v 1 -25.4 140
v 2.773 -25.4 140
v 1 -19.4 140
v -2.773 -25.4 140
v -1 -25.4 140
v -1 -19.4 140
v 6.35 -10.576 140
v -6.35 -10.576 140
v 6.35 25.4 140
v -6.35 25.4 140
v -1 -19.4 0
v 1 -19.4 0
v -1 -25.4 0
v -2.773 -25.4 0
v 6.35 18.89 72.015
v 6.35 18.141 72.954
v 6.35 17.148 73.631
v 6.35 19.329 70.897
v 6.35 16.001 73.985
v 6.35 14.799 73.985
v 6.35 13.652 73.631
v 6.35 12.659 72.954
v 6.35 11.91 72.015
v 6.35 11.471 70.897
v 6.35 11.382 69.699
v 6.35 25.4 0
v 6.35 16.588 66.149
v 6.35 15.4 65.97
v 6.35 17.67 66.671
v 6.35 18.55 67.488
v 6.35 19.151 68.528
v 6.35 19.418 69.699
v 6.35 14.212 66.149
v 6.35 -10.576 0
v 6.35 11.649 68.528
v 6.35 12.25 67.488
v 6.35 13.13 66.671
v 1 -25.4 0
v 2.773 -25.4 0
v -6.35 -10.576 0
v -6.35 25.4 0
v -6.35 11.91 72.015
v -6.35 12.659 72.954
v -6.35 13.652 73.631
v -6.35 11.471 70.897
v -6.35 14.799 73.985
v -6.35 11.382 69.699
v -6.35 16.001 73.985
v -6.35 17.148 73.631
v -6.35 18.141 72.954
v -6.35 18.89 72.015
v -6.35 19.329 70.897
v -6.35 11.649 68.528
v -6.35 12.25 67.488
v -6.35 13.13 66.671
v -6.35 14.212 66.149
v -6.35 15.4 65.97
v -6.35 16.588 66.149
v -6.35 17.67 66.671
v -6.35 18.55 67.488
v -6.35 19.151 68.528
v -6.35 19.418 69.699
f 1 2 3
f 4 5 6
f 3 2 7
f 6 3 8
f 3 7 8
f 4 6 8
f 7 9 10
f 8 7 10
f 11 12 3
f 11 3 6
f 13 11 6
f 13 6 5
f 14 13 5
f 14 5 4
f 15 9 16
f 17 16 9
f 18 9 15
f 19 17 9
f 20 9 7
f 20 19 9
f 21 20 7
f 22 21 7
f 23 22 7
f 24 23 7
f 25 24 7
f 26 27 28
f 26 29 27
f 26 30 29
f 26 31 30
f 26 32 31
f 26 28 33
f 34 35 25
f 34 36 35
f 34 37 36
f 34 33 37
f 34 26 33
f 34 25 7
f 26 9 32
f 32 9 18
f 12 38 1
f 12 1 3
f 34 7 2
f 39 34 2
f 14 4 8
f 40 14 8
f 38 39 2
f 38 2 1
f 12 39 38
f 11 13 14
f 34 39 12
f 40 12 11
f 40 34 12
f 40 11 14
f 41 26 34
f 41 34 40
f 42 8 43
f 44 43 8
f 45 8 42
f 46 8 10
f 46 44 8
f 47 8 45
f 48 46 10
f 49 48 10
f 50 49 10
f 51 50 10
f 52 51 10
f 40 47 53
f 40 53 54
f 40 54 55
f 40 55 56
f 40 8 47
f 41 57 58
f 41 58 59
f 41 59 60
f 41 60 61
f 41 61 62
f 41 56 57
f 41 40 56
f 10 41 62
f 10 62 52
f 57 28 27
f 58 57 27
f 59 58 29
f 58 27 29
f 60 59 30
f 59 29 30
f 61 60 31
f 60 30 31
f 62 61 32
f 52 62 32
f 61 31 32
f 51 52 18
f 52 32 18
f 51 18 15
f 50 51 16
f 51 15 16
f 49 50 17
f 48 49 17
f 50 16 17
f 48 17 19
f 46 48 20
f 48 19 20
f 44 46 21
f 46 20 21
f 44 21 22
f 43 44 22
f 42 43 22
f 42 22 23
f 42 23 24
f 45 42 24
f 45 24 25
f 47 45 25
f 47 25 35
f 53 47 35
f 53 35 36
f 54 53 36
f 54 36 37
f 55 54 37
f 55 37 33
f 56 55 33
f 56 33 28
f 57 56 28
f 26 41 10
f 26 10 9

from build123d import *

# Parameters (mm, degrees)
SALIENTE_EXTRUIR1_DEPTH = 140
CROQUIS2_R              = 4.029640203
CORTAR_EXTRUIR1_DEPTH   = 140


with BuildPart() as part:
    # Croquis1 → Saliente-Extruir1 (new body)
    with BuildSketch(Plane.XY):
        Polygon((-1, -25.4), (-2.773222037, -25.4), (-6.35, -10.576393443), (-6.35, 25.4), (6.35, 25.4), (6.35, -10.576393443), (2.773222037, -25.4), (1, -25.4), (1, -19.4), (-1, -19.4), align=None)
    extrude(amount=SALIENTE_EXTRUIR1_DEPTH)

    # Croquis2 → Cortar-Extruir1 (cut)
    with BuildSketch(Plane(origin=(6.35, 0, 0), x_dir=(0, 0, -1), z_dir=(1, 0, 0))):
        with Locations((-70, 15.4)):
            Circle(CROQUIS2_R)
    extrude(amount=-CORTAR_EXTRUIR1_DEPTH, mode=Mode.SUBTRACT)


solid = part.part
